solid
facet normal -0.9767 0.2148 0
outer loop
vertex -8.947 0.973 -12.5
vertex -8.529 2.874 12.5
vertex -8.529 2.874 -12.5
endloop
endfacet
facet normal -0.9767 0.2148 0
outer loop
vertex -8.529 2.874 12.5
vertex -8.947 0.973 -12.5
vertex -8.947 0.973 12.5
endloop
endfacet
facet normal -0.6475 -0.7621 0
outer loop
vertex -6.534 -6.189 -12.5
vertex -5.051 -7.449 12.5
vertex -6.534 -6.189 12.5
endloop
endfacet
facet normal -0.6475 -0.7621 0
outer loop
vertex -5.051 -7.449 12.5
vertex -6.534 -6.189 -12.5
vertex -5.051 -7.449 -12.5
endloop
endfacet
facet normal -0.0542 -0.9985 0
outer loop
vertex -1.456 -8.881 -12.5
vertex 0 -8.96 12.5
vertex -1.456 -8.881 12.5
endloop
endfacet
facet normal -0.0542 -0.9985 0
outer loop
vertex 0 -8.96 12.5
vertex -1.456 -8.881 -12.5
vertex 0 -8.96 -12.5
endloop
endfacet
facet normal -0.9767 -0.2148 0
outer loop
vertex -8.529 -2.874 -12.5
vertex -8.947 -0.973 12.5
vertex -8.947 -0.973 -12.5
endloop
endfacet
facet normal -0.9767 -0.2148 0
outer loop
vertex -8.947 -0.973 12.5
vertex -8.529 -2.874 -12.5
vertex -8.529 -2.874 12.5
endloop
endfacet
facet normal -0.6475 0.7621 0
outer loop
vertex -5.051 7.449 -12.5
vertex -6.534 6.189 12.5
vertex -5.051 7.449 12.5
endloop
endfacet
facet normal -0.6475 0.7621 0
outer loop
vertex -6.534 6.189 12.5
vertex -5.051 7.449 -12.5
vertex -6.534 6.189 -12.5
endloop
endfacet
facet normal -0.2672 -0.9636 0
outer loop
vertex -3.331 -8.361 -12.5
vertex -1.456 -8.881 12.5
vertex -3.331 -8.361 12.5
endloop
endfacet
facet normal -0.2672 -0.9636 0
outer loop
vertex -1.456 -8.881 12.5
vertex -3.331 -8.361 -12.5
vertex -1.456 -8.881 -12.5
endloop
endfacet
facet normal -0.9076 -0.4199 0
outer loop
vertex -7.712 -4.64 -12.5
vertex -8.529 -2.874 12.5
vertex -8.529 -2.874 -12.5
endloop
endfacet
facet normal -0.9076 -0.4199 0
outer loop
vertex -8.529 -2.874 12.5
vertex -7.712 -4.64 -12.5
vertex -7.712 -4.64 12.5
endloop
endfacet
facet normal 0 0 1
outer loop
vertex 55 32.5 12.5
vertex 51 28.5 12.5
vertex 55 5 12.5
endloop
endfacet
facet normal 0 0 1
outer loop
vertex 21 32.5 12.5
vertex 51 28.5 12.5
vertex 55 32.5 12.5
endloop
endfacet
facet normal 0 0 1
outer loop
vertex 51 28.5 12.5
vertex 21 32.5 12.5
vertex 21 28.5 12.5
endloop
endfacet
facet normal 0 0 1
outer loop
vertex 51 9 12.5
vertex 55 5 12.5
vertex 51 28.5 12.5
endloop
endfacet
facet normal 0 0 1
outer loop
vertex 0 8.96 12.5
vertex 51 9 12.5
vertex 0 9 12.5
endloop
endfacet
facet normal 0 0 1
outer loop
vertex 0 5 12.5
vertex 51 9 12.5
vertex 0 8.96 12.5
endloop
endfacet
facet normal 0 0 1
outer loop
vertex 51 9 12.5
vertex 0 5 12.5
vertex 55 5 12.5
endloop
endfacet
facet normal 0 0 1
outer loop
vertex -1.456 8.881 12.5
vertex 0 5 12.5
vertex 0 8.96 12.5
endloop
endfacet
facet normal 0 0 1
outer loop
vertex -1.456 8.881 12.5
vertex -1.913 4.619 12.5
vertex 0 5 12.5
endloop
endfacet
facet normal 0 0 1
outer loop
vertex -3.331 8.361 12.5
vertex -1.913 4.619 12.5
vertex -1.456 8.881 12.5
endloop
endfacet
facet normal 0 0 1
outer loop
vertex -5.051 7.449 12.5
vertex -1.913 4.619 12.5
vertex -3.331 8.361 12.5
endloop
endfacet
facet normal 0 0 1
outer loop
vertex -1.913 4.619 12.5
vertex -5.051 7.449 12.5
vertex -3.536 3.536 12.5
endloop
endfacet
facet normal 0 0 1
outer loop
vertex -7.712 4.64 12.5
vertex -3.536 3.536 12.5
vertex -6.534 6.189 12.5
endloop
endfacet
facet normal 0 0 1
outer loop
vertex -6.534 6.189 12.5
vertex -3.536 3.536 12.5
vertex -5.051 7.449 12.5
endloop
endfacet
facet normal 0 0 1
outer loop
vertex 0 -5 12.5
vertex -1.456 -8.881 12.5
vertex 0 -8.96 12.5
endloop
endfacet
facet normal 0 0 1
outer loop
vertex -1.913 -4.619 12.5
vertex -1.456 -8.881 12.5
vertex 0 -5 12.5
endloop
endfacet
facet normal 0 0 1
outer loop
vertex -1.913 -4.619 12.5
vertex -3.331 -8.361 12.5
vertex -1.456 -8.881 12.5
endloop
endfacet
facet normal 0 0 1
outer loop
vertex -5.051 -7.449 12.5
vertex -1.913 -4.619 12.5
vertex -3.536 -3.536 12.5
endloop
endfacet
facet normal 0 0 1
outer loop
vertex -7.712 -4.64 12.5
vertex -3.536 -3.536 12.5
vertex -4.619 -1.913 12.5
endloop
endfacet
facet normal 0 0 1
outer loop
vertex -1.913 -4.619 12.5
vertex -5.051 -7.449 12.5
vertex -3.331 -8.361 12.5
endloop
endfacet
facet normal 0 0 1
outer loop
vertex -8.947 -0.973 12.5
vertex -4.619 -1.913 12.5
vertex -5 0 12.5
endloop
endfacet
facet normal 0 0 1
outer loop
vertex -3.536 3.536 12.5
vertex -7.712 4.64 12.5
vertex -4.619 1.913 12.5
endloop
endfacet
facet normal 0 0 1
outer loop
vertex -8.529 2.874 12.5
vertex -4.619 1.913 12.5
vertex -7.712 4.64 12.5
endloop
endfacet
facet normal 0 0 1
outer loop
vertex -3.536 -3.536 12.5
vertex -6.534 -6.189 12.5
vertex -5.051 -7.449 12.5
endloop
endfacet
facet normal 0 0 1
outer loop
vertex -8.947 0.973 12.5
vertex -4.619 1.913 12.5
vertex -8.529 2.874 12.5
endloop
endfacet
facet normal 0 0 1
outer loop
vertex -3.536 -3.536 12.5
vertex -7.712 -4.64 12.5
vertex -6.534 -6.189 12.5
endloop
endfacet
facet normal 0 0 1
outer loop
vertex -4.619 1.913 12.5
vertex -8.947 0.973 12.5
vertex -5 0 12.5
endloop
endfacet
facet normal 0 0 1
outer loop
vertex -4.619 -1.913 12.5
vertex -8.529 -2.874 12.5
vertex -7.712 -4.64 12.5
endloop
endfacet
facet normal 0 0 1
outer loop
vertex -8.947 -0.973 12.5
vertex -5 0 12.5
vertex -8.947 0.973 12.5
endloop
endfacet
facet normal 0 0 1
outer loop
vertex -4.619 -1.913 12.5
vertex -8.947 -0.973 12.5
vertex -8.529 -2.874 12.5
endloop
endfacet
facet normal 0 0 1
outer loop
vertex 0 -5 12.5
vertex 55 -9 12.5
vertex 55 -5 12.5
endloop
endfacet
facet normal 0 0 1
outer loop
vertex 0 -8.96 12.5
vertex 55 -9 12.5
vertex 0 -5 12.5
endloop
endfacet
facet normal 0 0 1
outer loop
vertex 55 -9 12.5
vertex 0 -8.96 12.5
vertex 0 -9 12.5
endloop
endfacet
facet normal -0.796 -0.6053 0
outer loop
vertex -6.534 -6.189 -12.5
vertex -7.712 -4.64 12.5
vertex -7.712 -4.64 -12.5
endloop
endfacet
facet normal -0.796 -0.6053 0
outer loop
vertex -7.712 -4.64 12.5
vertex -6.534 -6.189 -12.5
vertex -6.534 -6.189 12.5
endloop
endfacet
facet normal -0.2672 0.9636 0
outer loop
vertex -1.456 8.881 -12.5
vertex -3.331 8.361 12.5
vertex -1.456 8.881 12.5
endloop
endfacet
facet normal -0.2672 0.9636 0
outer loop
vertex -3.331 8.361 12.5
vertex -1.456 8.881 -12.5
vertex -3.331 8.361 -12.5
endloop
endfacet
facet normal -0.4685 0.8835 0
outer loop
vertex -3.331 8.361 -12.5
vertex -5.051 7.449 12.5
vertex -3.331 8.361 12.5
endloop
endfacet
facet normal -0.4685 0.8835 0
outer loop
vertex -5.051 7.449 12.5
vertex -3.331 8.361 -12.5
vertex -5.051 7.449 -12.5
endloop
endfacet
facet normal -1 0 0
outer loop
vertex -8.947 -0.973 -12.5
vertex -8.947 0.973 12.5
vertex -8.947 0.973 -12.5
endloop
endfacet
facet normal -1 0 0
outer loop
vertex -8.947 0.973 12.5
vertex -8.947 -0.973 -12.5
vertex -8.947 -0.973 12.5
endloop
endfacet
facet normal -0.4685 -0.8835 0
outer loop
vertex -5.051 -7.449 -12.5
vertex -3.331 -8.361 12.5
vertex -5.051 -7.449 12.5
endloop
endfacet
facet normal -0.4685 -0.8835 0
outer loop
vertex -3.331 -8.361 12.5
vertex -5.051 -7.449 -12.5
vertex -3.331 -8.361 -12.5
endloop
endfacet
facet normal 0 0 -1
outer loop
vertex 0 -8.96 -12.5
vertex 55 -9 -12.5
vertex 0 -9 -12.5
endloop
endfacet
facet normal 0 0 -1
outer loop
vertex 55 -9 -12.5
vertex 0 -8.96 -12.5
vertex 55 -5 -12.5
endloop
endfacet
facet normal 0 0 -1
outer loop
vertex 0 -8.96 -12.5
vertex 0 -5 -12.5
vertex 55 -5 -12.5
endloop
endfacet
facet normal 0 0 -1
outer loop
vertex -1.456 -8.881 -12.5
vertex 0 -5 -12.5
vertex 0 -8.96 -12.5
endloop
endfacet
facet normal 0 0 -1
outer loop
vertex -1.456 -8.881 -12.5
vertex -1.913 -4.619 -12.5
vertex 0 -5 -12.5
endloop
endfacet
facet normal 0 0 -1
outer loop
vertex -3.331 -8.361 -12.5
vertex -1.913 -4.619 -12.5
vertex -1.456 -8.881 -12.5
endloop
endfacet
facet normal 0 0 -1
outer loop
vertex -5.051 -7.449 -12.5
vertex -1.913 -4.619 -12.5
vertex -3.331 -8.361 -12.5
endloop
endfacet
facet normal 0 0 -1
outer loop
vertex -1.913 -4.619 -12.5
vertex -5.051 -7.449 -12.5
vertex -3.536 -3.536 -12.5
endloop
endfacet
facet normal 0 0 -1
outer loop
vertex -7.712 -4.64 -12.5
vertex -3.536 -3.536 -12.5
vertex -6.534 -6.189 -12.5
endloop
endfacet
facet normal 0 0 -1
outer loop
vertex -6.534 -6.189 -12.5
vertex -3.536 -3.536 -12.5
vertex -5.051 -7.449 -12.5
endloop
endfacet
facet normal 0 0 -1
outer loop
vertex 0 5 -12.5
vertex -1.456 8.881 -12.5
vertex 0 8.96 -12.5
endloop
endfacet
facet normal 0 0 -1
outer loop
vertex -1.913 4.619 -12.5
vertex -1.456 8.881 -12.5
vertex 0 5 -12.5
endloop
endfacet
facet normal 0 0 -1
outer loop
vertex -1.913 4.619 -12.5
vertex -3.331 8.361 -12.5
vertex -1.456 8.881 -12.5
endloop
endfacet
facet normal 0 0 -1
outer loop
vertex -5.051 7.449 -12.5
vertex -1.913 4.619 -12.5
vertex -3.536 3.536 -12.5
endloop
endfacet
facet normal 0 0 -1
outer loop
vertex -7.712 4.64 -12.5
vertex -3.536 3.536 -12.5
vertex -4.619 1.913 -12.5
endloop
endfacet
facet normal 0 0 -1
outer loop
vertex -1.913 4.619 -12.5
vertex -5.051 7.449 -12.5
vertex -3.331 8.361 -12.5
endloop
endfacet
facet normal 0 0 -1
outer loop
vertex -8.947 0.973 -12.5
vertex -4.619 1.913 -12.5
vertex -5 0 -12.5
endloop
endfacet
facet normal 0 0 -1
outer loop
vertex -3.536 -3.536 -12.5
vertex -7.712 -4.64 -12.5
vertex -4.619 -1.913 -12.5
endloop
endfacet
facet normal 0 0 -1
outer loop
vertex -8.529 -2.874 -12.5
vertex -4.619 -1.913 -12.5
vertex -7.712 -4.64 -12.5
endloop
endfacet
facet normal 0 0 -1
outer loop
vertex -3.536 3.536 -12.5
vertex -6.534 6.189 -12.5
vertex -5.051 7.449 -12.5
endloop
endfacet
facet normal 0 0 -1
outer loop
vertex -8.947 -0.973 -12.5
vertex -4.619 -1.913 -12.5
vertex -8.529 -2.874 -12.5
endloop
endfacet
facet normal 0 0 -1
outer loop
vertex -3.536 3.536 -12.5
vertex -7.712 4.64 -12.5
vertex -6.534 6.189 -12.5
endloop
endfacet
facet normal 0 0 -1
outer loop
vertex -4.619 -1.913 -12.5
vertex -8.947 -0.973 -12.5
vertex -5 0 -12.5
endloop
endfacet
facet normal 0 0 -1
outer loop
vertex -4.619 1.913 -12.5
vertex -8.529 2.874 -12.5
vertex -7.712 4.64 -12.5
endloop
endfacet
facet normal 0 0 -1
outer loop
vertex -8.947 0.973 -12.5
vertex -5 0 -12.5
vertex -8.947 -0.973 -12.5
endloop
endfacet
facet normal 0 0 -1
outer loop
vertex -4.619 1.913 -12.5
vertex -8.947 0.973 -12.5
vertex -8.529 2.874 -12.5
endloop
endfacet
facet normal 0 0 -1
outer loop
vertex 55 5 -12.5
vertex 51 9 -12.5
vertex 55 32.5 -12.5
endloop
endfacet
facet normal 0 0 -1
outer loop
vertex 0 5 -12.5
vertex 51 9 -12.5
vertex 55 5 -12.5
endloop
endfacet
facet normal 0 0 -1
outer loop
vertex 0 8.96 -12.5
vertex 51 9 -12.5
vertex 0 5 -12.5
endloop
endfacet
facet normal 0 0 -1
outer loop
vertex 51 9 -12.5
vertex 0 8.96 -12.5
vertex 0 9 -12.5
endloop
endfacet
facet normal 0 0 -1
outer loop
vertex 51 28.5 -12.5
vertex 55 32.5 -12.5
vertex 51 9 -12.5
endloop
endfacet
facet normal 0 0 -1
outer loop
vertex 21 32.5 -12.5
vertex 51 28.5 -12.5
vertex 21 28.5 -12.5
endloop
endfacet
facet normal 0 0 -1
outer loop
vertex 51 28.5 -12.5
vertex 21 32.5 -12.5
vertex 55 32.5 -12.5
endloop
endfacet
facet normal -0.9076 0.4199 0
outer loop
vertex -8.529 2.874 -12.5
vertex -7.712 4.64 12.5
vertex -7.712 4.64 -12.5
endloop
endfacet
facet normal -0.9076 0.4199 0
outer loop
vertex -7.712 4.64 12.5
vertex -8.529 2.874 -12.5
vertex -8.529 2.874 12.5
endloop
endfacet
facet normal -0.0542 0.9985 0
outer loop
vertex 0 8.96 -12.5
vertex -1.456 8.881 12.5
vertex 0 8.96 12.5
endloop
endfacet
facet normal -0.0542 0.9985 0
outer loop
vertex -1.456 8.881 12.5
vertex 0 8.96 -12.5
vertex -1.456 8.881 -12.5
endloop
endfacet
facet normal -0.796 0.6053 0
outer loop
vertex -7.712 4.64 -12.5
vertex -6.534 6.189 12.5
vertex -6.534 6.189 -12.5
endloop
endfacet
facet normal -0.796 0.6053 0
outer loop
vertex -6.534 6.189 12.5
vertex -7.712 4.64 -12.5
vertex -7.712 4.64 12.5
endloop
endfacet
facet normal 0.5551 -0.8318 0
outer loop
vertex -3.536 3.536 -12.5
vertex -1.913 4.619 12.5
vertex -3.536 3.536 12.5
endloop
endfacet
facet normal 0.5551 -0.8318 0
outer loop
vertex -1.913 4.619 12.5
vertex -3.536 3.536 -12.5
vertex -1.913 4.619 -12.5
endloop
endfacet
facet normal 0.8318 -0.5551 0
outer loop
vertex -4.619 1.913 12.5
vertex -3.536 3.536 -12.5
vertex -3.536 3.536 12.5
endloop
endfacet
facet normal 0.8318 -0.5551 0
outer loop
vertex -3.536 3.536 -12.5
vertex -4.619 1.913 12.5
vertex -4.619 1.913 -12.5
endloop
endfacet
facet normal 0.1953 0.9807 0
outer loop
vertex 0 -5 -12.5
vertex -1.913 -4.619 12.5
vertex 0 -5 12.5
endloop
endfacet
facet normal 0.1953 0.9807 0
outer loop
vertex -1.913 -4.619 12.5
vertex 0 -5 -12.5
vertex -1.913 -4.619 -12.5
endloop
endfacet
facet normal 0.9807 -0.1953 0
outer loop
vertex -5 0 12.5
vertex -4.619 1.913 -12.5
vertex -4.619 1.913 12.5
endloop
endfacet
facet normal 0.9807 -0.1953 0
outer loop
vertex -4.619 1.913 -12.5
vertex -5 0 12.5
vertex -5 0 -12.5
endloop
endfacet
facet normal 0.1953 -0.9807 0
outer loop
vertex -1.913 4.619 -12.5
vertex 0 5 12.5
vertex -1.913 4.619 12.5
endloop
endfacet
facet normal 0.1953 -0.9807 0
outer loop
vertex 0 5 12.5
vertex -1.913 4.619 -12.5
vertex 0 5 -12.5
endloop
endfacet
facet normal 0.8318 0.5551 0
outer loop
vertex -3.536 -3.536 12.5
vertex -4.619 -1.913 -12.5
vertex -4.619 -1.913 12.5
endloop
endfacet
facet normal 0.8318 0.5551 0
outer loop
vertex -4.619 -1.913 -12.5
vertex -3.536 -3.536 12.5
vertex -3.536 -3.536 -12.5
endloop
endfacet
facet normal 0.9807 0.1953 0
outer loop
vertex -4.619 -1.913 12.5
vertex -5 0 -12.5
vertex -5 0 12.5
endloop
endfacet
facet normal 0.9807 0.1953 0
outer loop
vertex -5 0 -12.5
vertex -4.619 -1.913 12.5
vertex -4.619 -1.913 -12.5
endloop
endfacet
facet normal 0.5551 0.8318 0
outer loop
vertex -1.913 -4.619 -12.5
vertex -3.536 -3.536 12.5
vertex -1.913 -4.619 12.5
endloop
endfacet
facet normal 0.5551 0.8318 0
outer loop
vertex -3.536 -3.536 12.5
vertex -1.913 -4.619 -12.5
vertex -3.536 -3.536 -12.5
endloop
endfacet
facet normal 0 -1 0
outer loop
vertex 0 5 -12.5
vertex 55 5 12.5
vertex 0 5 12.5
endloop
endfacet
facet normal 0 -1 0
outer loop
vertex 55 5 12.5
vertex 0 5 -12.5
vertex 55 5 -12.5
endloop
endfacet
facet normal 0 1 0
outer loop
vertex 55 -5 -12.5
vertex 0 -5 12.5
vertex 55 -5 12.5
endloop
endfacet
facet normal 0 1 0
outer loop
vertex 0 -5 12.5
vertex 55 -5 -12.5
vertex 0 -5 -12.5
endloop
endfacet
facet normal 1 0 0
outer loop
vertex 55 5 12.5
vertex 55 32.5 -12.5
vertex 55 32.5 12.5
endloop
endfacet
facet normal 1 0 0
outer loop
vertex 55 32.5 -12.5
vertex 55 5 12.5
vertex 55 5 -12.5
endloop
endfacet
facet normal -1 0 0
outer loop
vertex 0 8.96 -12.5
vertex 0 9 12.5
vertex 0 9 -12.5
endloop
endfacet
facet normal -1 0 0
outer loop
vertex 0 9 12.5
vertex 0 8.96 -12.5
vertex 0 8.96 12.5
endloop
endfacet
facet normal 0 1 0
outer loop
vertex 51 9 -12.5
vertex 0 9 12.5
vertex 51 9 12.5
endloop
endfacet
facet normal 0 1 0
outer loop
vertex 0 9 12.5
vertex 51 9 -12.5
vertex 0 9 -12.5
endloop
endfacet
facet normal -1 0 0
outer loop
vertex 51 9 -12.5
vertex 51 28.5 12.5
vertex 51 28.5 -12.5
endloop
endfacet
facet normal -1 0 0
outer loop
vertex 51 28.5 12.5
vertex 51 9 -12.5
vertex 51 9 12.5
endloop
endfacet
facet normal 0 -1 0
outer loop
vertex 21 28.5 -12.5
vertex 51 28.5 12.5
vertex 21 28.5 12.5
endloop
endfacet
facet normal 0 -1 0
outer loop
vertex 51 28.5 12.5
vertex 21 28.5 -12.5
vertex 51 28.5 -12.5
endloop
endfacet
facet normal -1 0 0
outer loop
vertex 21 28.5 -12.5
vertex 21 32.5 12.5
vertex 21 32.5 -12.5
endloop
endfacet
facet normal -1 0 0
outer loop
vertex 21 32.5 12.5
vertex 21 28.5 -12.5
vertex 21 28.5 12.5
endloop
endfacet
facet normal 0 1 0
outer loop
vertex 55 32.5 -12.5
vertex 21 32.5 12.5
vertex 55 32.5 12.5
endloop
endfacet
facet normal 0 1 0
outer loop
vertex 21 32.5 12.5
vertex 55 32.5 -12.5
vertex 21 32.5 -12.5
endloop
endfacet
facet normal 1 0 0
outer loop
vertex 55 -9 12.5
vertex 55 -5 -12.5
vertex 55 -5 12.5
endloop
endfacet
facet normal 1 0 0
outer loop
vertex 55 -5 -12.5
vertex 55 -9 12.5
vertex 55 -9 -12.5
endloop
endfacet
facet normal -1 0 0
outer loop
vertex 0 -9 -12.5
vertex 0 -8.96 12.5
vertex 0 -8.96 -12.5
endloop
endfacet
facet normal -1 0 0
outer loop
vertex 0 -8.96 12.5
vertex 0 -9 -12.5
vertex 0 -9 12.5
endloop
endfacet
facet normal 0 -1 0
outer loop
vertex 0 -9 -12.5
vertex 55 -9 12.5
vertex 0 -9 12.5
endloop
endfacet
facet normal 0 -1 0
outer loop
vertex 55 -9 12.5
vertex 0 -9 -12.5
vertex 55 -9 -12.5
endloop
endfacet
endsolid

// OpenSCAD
/* [Hook] */

// thickness of upper hook
doorthickness=19.5; // [1:100]
// height of upper hook
doorheight=30; // [1:100]
// diameter of bottom hook
dia=10; // [1:100]
// Width of whole hook
width=25; // [1:100]
// Length of body of hook
length=60; // [1:100]
// Overral thickness of hook
thickness=4; // [1:100]
// Height of the bottom hook 
hookheight=50; // [1:100]

// close hook
closeHook=false;

/* [Hidden] */
difference()
{
	cylinder(h=width,r=.5*dia+thickness,center=true);
	cylinder(h=width+1,r=.5*dia, center=true);
    translate([dia,0,0]) cube([2*dia,dia,width],center=true);
}

translate([0,.5*dia,-.5*width]) 
	cube([length-.5*dia,thickness,width]);

translate([length-.5*dia-thickness,.5*dia+thickness,-.5*width]) 
	cube([thickness,doorthickness,width]);

translate([length-.5*dia-doorheight-thickness,.5*dia+doorthickness+thickness,-.5*width]) 
	cube([doorheight+thickness,thickness,width]);

translate([0,-.5*dia-thickness,-.5*width]) 
	cube([.5*dia+hookheight,thickness,width]);

if(closeHook) {
translate([-.5*dia,-.5*dia,-.5*width]) 
	cube([dia+hookheight,dia,thickness]);
    
}
